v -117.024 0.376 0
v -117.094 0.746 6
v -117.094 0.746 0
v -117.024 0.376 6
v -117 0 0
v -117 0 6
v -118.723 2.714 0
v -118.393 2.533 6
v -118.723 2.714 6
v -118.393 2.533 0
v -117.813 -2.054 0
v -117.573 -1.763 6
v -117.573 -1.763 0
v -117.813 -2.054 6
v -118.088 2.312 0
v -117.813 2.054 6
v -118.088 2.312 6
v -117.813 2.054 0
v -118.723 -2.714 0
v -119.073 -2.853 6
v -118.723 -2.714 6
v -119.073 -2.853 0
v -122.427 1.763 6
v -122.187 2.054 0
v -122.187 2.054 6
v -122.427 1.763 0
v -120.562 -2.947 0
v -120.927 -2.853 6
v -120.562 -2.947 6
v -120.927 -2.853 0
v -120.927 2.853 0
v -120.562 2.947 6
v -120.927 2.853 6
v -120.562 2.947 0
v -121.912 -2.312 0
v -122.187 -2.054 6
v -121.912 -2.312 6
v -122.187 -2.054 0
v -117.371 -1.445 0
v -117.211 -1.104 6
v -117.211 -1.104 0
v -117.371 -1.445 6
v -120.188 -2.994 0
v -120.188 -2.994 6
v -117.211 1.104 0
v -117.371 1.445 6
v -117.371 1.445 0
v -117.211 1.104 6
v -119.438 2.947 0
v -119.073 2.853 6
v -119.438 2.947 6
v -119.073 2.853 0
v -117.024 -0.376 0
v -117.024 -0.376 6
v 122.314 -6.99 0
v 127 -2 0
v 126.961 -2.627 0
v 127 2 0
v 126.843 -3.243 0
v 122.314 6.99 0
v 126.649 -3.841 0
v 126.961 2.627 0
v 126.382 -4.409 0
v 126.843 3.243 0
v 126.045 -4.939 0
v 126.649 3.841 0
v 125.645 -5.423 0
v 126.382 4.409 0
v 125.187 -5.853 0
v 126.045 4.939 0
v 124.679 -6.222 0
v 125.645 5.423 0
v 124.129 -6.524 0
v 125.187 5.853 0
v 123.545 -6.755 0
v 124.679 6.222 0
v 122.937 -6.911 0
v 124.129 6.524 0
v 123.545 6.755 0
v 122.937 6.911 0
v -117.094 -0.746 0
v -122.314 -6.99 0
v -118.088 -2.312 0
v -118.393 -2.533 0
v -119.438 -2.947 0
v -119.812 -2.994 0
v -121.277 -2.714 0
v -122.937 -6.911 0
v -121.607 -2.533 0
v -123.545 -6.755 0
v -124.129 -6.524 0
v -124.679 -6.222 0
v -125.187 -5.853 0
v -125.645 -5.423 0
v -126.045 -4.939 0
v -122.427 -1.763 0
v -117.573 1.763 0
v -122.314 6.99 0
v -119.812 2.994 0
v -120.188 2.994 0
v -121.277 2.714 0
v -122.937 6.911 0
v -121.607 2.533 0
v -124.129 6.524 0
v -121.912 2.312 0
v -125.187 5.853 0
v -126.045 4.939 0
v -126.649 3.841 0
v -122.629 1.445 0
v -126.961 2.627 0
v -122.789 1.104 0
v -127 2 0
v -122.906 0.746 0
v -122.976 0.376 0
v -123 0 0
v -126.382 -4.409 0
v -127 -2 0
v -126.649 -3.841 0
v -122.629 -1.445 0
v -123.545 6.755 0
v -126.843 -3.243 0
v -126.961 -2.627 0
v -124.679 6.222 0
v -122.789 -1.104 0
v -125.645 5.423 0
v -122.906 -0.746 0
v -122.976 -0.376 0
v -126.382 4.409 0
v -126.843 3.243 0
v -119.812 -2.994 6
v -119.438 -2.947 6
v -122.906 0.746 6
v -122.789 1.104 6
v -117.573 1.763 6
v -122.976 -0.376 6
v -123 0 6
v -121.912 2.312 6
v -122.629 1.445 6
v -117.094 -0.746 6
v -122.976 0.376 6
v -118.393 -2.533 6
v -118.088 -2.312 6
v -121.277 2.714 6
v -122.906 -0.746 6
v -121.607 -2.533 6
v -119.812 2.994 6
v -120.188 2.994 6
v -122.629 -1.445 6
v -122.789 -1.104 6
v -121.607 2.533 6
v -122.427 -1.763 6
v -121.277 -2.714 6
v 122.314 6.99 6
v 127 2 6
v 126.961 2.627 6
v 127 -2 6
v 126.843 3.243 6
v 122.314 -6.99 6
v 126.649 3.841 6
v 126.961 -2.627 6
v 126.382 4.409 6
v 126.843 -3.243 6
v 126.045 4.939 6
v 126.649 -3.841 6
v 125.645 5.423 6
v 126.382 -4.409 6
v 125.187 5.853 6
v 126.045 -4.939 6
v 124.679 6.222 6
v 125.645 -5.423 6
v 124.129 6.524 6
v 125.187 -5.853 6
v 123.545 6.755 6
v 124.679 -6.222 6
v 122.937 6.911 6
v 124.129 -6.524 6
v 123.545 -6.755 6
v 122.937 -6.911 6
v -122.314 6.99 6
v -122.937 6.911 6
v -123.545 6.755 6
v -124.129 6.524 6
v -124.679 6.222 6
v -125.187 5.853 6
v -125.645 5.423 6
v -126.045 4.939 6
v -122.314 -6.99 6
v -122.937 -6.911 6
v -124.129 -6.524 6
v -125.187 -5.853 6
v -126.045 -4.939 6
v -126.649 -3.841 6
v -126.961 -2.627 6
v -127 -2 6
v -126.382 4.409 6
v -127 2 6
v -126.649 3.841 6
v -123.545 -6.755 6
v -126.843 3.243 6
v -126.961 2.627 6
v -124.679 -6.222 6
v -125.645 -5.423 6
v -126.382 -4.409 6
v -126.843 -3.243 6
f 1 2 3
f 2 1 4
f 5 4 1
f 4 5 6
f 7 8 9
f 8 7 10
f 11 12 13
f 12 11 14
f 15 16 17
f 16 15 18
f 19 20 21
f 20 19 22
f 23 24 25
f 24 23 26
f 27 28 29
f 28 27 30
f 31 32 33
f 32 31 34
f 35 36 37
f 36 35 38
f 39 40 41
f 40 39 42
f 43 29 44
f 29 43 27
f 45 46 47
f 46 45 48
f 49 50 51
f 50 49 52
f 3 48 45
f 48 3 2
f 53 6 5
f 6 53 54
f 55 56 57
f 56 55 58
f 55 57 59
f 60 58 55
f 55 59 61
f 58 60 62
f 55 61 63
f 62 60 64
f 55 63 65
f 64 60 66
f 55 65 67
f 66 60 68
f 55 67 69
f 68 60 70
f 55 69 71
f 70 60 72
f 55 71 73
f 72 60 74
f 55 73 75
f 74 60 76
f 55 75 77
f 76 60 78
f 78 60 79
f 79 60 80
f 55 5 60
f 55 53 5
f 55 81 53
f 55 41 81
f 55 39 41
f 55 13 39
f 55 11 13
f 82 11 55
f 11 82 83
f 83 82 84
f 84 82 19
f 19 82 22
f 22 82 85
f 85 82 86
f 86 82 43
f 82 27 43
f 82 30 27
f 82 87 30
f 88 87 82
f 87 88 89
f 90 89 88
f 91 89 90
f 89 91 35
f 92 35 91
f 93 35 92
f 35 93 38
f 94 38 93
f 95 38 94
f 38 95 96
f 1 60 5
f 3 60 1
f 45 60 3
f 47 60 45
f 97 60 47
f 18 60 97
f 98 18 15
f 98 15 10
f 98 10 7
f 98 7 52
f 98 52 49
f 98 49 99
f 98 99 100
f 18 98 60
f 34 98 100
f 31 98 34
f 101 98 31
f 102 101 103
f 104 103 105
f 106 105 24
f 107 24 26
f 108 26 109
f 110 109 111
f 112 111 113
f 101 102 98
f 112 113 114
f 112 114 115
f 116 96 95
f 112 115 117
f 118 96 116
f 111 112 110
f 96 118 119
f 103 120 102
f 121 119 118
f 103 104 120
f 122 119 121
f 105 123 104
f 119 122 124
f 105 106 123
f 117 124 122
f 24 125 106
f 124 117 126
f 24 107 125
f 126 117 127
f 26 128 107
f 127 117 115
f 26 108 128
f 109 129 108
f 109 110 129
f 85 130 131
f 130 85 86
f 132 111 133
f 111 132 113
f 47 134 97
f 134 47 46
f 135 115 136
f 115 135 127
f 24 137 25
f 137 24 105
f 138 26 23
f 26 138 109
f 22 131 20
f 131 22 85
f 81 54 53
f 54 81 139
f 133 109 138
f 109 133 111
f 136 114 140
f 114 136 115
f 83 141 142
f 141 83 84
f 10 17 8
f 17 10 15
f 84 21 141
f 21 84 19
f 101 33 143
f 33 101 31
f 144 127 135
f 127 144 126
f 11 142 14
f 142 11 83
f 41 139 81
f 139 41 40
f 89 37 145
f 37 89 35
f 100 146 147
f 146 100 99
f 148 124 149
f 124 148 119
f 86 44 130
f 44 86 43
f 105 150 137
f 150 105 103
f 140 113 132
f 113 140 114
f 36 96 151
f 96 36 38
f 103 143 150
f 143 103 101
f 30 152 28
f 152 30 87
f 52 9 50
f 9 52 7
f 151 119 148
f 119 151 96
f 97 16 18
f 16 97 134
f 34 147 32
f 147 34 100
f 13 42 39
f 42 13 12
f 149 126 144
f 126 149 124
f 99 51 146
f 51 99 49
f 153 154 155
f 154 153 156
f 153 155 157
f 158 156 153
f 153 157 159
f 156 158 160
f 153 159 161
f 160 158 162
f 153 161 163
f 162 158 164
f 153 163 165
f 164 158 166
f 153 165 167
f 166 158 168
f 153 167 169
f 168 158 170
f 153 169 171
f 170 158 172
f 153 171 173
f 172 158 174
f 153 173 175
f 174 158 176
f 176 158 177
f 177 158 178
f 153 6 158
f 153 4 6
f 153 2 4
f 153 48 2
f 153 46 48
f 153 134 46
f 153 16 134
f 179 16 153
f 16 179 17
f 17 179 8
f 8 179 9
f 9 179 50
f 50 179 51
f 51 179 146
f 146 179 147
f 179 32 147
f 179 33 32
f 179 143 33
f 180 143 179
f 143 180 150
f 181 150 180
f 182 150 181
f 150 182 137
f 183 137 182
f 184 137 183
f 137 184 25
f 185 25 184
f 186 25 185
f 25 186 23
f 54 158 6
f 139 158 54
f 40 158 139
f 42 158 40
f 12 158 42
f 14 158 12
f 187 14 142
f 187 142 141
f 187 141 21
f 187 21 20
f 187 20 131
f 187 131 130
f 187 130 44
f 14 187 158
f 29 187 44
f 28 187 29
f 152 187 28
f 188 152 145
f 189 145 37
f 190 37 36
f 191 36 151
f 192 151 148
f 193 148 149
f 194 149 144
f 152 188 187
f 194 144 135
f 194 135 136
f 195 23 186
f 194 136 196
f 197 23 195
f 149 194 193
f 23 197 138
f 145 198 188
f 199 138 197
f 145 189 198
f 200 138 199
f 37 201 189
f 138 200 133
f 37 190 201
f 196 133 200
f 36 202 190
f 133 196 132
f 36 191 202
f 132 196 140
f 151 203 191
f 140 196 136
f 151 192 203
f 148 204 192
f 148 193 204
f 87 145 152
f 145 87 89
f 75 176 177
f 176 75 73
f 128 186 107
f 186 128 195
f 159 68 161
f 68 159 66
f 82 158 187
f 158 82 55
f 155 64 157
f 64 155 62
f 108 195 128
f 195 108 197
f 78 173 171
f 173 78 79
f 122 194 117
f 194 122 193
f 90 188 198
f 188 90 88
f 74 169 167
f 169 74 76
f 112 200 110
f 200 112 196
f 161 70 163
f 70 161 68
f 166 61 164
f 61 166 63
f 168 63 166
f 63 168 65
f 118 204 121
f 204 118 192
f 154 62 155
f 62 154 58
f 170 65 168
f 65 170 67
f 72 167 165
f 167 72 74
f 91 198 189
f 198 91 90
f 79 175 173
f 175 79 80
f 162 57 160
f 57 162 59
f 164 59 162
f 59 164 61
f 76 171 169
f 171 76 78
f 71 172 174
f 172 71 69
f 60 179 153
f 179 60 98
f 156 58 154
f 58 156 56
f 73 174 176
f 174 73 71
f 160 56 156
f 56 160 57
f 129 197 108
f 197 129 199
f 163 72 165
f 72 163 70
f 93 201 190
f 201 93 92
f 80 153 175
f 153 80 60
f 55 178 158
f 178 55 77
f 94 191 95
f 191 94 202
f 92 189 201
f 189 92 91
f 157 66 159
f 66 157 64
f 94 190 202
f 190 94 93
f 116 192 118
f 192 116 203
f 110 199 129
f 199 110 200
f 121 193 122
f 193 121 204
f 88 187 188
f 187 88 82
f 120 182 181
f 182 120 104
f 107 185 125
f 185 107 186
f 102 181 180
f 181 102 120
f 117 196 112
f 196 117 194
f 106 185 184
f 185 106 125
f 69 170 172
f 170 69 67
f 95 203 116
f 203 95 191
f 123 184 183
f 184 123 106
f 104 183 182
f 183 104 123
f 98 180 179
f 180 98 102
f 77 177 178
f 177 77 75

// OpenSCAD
$fn = 50;


difference() {
	union() {
		hull() {
			translate(v = [-122.0000000000, 2.0000000000, 0]) {
				cylinder(h = 6, r = 5);
			}
			translate(v = [122.0000000000, 2.0000000000, 0]) {
				cylinder(h = 6, r = 5);
			}
			translate(v = [-122.0000000000, -2.0000000000, 0]) {
				cylinder(h = 6, r = 5);
			}
			translate(v = [122.0000000000, -2.0000000000, 0]) {
				cylinder(h = 6, r = 5);
			}
		}
	}
	union() {
		translate(v = [-120.0000000000, 0.0000000000, 0]) {
			cylinder(h = 6, r = 3.0000000000);
		}
		translate(v = [-120.0000000000, 0.0000000000, 0]) {
			cylinder(h = 6, r = 1.5000000000);
		}
		translate(v = [-120.0000000000, 0.0000000000, 0]) {
			cylinder(h = 6, r = 1.5000000000);
		}
		translate(v = [-120.0000000000, 0.0000000000, 0]) {
			cylinder(h = 6, r = 1.5000000000);
		}
	}
}
